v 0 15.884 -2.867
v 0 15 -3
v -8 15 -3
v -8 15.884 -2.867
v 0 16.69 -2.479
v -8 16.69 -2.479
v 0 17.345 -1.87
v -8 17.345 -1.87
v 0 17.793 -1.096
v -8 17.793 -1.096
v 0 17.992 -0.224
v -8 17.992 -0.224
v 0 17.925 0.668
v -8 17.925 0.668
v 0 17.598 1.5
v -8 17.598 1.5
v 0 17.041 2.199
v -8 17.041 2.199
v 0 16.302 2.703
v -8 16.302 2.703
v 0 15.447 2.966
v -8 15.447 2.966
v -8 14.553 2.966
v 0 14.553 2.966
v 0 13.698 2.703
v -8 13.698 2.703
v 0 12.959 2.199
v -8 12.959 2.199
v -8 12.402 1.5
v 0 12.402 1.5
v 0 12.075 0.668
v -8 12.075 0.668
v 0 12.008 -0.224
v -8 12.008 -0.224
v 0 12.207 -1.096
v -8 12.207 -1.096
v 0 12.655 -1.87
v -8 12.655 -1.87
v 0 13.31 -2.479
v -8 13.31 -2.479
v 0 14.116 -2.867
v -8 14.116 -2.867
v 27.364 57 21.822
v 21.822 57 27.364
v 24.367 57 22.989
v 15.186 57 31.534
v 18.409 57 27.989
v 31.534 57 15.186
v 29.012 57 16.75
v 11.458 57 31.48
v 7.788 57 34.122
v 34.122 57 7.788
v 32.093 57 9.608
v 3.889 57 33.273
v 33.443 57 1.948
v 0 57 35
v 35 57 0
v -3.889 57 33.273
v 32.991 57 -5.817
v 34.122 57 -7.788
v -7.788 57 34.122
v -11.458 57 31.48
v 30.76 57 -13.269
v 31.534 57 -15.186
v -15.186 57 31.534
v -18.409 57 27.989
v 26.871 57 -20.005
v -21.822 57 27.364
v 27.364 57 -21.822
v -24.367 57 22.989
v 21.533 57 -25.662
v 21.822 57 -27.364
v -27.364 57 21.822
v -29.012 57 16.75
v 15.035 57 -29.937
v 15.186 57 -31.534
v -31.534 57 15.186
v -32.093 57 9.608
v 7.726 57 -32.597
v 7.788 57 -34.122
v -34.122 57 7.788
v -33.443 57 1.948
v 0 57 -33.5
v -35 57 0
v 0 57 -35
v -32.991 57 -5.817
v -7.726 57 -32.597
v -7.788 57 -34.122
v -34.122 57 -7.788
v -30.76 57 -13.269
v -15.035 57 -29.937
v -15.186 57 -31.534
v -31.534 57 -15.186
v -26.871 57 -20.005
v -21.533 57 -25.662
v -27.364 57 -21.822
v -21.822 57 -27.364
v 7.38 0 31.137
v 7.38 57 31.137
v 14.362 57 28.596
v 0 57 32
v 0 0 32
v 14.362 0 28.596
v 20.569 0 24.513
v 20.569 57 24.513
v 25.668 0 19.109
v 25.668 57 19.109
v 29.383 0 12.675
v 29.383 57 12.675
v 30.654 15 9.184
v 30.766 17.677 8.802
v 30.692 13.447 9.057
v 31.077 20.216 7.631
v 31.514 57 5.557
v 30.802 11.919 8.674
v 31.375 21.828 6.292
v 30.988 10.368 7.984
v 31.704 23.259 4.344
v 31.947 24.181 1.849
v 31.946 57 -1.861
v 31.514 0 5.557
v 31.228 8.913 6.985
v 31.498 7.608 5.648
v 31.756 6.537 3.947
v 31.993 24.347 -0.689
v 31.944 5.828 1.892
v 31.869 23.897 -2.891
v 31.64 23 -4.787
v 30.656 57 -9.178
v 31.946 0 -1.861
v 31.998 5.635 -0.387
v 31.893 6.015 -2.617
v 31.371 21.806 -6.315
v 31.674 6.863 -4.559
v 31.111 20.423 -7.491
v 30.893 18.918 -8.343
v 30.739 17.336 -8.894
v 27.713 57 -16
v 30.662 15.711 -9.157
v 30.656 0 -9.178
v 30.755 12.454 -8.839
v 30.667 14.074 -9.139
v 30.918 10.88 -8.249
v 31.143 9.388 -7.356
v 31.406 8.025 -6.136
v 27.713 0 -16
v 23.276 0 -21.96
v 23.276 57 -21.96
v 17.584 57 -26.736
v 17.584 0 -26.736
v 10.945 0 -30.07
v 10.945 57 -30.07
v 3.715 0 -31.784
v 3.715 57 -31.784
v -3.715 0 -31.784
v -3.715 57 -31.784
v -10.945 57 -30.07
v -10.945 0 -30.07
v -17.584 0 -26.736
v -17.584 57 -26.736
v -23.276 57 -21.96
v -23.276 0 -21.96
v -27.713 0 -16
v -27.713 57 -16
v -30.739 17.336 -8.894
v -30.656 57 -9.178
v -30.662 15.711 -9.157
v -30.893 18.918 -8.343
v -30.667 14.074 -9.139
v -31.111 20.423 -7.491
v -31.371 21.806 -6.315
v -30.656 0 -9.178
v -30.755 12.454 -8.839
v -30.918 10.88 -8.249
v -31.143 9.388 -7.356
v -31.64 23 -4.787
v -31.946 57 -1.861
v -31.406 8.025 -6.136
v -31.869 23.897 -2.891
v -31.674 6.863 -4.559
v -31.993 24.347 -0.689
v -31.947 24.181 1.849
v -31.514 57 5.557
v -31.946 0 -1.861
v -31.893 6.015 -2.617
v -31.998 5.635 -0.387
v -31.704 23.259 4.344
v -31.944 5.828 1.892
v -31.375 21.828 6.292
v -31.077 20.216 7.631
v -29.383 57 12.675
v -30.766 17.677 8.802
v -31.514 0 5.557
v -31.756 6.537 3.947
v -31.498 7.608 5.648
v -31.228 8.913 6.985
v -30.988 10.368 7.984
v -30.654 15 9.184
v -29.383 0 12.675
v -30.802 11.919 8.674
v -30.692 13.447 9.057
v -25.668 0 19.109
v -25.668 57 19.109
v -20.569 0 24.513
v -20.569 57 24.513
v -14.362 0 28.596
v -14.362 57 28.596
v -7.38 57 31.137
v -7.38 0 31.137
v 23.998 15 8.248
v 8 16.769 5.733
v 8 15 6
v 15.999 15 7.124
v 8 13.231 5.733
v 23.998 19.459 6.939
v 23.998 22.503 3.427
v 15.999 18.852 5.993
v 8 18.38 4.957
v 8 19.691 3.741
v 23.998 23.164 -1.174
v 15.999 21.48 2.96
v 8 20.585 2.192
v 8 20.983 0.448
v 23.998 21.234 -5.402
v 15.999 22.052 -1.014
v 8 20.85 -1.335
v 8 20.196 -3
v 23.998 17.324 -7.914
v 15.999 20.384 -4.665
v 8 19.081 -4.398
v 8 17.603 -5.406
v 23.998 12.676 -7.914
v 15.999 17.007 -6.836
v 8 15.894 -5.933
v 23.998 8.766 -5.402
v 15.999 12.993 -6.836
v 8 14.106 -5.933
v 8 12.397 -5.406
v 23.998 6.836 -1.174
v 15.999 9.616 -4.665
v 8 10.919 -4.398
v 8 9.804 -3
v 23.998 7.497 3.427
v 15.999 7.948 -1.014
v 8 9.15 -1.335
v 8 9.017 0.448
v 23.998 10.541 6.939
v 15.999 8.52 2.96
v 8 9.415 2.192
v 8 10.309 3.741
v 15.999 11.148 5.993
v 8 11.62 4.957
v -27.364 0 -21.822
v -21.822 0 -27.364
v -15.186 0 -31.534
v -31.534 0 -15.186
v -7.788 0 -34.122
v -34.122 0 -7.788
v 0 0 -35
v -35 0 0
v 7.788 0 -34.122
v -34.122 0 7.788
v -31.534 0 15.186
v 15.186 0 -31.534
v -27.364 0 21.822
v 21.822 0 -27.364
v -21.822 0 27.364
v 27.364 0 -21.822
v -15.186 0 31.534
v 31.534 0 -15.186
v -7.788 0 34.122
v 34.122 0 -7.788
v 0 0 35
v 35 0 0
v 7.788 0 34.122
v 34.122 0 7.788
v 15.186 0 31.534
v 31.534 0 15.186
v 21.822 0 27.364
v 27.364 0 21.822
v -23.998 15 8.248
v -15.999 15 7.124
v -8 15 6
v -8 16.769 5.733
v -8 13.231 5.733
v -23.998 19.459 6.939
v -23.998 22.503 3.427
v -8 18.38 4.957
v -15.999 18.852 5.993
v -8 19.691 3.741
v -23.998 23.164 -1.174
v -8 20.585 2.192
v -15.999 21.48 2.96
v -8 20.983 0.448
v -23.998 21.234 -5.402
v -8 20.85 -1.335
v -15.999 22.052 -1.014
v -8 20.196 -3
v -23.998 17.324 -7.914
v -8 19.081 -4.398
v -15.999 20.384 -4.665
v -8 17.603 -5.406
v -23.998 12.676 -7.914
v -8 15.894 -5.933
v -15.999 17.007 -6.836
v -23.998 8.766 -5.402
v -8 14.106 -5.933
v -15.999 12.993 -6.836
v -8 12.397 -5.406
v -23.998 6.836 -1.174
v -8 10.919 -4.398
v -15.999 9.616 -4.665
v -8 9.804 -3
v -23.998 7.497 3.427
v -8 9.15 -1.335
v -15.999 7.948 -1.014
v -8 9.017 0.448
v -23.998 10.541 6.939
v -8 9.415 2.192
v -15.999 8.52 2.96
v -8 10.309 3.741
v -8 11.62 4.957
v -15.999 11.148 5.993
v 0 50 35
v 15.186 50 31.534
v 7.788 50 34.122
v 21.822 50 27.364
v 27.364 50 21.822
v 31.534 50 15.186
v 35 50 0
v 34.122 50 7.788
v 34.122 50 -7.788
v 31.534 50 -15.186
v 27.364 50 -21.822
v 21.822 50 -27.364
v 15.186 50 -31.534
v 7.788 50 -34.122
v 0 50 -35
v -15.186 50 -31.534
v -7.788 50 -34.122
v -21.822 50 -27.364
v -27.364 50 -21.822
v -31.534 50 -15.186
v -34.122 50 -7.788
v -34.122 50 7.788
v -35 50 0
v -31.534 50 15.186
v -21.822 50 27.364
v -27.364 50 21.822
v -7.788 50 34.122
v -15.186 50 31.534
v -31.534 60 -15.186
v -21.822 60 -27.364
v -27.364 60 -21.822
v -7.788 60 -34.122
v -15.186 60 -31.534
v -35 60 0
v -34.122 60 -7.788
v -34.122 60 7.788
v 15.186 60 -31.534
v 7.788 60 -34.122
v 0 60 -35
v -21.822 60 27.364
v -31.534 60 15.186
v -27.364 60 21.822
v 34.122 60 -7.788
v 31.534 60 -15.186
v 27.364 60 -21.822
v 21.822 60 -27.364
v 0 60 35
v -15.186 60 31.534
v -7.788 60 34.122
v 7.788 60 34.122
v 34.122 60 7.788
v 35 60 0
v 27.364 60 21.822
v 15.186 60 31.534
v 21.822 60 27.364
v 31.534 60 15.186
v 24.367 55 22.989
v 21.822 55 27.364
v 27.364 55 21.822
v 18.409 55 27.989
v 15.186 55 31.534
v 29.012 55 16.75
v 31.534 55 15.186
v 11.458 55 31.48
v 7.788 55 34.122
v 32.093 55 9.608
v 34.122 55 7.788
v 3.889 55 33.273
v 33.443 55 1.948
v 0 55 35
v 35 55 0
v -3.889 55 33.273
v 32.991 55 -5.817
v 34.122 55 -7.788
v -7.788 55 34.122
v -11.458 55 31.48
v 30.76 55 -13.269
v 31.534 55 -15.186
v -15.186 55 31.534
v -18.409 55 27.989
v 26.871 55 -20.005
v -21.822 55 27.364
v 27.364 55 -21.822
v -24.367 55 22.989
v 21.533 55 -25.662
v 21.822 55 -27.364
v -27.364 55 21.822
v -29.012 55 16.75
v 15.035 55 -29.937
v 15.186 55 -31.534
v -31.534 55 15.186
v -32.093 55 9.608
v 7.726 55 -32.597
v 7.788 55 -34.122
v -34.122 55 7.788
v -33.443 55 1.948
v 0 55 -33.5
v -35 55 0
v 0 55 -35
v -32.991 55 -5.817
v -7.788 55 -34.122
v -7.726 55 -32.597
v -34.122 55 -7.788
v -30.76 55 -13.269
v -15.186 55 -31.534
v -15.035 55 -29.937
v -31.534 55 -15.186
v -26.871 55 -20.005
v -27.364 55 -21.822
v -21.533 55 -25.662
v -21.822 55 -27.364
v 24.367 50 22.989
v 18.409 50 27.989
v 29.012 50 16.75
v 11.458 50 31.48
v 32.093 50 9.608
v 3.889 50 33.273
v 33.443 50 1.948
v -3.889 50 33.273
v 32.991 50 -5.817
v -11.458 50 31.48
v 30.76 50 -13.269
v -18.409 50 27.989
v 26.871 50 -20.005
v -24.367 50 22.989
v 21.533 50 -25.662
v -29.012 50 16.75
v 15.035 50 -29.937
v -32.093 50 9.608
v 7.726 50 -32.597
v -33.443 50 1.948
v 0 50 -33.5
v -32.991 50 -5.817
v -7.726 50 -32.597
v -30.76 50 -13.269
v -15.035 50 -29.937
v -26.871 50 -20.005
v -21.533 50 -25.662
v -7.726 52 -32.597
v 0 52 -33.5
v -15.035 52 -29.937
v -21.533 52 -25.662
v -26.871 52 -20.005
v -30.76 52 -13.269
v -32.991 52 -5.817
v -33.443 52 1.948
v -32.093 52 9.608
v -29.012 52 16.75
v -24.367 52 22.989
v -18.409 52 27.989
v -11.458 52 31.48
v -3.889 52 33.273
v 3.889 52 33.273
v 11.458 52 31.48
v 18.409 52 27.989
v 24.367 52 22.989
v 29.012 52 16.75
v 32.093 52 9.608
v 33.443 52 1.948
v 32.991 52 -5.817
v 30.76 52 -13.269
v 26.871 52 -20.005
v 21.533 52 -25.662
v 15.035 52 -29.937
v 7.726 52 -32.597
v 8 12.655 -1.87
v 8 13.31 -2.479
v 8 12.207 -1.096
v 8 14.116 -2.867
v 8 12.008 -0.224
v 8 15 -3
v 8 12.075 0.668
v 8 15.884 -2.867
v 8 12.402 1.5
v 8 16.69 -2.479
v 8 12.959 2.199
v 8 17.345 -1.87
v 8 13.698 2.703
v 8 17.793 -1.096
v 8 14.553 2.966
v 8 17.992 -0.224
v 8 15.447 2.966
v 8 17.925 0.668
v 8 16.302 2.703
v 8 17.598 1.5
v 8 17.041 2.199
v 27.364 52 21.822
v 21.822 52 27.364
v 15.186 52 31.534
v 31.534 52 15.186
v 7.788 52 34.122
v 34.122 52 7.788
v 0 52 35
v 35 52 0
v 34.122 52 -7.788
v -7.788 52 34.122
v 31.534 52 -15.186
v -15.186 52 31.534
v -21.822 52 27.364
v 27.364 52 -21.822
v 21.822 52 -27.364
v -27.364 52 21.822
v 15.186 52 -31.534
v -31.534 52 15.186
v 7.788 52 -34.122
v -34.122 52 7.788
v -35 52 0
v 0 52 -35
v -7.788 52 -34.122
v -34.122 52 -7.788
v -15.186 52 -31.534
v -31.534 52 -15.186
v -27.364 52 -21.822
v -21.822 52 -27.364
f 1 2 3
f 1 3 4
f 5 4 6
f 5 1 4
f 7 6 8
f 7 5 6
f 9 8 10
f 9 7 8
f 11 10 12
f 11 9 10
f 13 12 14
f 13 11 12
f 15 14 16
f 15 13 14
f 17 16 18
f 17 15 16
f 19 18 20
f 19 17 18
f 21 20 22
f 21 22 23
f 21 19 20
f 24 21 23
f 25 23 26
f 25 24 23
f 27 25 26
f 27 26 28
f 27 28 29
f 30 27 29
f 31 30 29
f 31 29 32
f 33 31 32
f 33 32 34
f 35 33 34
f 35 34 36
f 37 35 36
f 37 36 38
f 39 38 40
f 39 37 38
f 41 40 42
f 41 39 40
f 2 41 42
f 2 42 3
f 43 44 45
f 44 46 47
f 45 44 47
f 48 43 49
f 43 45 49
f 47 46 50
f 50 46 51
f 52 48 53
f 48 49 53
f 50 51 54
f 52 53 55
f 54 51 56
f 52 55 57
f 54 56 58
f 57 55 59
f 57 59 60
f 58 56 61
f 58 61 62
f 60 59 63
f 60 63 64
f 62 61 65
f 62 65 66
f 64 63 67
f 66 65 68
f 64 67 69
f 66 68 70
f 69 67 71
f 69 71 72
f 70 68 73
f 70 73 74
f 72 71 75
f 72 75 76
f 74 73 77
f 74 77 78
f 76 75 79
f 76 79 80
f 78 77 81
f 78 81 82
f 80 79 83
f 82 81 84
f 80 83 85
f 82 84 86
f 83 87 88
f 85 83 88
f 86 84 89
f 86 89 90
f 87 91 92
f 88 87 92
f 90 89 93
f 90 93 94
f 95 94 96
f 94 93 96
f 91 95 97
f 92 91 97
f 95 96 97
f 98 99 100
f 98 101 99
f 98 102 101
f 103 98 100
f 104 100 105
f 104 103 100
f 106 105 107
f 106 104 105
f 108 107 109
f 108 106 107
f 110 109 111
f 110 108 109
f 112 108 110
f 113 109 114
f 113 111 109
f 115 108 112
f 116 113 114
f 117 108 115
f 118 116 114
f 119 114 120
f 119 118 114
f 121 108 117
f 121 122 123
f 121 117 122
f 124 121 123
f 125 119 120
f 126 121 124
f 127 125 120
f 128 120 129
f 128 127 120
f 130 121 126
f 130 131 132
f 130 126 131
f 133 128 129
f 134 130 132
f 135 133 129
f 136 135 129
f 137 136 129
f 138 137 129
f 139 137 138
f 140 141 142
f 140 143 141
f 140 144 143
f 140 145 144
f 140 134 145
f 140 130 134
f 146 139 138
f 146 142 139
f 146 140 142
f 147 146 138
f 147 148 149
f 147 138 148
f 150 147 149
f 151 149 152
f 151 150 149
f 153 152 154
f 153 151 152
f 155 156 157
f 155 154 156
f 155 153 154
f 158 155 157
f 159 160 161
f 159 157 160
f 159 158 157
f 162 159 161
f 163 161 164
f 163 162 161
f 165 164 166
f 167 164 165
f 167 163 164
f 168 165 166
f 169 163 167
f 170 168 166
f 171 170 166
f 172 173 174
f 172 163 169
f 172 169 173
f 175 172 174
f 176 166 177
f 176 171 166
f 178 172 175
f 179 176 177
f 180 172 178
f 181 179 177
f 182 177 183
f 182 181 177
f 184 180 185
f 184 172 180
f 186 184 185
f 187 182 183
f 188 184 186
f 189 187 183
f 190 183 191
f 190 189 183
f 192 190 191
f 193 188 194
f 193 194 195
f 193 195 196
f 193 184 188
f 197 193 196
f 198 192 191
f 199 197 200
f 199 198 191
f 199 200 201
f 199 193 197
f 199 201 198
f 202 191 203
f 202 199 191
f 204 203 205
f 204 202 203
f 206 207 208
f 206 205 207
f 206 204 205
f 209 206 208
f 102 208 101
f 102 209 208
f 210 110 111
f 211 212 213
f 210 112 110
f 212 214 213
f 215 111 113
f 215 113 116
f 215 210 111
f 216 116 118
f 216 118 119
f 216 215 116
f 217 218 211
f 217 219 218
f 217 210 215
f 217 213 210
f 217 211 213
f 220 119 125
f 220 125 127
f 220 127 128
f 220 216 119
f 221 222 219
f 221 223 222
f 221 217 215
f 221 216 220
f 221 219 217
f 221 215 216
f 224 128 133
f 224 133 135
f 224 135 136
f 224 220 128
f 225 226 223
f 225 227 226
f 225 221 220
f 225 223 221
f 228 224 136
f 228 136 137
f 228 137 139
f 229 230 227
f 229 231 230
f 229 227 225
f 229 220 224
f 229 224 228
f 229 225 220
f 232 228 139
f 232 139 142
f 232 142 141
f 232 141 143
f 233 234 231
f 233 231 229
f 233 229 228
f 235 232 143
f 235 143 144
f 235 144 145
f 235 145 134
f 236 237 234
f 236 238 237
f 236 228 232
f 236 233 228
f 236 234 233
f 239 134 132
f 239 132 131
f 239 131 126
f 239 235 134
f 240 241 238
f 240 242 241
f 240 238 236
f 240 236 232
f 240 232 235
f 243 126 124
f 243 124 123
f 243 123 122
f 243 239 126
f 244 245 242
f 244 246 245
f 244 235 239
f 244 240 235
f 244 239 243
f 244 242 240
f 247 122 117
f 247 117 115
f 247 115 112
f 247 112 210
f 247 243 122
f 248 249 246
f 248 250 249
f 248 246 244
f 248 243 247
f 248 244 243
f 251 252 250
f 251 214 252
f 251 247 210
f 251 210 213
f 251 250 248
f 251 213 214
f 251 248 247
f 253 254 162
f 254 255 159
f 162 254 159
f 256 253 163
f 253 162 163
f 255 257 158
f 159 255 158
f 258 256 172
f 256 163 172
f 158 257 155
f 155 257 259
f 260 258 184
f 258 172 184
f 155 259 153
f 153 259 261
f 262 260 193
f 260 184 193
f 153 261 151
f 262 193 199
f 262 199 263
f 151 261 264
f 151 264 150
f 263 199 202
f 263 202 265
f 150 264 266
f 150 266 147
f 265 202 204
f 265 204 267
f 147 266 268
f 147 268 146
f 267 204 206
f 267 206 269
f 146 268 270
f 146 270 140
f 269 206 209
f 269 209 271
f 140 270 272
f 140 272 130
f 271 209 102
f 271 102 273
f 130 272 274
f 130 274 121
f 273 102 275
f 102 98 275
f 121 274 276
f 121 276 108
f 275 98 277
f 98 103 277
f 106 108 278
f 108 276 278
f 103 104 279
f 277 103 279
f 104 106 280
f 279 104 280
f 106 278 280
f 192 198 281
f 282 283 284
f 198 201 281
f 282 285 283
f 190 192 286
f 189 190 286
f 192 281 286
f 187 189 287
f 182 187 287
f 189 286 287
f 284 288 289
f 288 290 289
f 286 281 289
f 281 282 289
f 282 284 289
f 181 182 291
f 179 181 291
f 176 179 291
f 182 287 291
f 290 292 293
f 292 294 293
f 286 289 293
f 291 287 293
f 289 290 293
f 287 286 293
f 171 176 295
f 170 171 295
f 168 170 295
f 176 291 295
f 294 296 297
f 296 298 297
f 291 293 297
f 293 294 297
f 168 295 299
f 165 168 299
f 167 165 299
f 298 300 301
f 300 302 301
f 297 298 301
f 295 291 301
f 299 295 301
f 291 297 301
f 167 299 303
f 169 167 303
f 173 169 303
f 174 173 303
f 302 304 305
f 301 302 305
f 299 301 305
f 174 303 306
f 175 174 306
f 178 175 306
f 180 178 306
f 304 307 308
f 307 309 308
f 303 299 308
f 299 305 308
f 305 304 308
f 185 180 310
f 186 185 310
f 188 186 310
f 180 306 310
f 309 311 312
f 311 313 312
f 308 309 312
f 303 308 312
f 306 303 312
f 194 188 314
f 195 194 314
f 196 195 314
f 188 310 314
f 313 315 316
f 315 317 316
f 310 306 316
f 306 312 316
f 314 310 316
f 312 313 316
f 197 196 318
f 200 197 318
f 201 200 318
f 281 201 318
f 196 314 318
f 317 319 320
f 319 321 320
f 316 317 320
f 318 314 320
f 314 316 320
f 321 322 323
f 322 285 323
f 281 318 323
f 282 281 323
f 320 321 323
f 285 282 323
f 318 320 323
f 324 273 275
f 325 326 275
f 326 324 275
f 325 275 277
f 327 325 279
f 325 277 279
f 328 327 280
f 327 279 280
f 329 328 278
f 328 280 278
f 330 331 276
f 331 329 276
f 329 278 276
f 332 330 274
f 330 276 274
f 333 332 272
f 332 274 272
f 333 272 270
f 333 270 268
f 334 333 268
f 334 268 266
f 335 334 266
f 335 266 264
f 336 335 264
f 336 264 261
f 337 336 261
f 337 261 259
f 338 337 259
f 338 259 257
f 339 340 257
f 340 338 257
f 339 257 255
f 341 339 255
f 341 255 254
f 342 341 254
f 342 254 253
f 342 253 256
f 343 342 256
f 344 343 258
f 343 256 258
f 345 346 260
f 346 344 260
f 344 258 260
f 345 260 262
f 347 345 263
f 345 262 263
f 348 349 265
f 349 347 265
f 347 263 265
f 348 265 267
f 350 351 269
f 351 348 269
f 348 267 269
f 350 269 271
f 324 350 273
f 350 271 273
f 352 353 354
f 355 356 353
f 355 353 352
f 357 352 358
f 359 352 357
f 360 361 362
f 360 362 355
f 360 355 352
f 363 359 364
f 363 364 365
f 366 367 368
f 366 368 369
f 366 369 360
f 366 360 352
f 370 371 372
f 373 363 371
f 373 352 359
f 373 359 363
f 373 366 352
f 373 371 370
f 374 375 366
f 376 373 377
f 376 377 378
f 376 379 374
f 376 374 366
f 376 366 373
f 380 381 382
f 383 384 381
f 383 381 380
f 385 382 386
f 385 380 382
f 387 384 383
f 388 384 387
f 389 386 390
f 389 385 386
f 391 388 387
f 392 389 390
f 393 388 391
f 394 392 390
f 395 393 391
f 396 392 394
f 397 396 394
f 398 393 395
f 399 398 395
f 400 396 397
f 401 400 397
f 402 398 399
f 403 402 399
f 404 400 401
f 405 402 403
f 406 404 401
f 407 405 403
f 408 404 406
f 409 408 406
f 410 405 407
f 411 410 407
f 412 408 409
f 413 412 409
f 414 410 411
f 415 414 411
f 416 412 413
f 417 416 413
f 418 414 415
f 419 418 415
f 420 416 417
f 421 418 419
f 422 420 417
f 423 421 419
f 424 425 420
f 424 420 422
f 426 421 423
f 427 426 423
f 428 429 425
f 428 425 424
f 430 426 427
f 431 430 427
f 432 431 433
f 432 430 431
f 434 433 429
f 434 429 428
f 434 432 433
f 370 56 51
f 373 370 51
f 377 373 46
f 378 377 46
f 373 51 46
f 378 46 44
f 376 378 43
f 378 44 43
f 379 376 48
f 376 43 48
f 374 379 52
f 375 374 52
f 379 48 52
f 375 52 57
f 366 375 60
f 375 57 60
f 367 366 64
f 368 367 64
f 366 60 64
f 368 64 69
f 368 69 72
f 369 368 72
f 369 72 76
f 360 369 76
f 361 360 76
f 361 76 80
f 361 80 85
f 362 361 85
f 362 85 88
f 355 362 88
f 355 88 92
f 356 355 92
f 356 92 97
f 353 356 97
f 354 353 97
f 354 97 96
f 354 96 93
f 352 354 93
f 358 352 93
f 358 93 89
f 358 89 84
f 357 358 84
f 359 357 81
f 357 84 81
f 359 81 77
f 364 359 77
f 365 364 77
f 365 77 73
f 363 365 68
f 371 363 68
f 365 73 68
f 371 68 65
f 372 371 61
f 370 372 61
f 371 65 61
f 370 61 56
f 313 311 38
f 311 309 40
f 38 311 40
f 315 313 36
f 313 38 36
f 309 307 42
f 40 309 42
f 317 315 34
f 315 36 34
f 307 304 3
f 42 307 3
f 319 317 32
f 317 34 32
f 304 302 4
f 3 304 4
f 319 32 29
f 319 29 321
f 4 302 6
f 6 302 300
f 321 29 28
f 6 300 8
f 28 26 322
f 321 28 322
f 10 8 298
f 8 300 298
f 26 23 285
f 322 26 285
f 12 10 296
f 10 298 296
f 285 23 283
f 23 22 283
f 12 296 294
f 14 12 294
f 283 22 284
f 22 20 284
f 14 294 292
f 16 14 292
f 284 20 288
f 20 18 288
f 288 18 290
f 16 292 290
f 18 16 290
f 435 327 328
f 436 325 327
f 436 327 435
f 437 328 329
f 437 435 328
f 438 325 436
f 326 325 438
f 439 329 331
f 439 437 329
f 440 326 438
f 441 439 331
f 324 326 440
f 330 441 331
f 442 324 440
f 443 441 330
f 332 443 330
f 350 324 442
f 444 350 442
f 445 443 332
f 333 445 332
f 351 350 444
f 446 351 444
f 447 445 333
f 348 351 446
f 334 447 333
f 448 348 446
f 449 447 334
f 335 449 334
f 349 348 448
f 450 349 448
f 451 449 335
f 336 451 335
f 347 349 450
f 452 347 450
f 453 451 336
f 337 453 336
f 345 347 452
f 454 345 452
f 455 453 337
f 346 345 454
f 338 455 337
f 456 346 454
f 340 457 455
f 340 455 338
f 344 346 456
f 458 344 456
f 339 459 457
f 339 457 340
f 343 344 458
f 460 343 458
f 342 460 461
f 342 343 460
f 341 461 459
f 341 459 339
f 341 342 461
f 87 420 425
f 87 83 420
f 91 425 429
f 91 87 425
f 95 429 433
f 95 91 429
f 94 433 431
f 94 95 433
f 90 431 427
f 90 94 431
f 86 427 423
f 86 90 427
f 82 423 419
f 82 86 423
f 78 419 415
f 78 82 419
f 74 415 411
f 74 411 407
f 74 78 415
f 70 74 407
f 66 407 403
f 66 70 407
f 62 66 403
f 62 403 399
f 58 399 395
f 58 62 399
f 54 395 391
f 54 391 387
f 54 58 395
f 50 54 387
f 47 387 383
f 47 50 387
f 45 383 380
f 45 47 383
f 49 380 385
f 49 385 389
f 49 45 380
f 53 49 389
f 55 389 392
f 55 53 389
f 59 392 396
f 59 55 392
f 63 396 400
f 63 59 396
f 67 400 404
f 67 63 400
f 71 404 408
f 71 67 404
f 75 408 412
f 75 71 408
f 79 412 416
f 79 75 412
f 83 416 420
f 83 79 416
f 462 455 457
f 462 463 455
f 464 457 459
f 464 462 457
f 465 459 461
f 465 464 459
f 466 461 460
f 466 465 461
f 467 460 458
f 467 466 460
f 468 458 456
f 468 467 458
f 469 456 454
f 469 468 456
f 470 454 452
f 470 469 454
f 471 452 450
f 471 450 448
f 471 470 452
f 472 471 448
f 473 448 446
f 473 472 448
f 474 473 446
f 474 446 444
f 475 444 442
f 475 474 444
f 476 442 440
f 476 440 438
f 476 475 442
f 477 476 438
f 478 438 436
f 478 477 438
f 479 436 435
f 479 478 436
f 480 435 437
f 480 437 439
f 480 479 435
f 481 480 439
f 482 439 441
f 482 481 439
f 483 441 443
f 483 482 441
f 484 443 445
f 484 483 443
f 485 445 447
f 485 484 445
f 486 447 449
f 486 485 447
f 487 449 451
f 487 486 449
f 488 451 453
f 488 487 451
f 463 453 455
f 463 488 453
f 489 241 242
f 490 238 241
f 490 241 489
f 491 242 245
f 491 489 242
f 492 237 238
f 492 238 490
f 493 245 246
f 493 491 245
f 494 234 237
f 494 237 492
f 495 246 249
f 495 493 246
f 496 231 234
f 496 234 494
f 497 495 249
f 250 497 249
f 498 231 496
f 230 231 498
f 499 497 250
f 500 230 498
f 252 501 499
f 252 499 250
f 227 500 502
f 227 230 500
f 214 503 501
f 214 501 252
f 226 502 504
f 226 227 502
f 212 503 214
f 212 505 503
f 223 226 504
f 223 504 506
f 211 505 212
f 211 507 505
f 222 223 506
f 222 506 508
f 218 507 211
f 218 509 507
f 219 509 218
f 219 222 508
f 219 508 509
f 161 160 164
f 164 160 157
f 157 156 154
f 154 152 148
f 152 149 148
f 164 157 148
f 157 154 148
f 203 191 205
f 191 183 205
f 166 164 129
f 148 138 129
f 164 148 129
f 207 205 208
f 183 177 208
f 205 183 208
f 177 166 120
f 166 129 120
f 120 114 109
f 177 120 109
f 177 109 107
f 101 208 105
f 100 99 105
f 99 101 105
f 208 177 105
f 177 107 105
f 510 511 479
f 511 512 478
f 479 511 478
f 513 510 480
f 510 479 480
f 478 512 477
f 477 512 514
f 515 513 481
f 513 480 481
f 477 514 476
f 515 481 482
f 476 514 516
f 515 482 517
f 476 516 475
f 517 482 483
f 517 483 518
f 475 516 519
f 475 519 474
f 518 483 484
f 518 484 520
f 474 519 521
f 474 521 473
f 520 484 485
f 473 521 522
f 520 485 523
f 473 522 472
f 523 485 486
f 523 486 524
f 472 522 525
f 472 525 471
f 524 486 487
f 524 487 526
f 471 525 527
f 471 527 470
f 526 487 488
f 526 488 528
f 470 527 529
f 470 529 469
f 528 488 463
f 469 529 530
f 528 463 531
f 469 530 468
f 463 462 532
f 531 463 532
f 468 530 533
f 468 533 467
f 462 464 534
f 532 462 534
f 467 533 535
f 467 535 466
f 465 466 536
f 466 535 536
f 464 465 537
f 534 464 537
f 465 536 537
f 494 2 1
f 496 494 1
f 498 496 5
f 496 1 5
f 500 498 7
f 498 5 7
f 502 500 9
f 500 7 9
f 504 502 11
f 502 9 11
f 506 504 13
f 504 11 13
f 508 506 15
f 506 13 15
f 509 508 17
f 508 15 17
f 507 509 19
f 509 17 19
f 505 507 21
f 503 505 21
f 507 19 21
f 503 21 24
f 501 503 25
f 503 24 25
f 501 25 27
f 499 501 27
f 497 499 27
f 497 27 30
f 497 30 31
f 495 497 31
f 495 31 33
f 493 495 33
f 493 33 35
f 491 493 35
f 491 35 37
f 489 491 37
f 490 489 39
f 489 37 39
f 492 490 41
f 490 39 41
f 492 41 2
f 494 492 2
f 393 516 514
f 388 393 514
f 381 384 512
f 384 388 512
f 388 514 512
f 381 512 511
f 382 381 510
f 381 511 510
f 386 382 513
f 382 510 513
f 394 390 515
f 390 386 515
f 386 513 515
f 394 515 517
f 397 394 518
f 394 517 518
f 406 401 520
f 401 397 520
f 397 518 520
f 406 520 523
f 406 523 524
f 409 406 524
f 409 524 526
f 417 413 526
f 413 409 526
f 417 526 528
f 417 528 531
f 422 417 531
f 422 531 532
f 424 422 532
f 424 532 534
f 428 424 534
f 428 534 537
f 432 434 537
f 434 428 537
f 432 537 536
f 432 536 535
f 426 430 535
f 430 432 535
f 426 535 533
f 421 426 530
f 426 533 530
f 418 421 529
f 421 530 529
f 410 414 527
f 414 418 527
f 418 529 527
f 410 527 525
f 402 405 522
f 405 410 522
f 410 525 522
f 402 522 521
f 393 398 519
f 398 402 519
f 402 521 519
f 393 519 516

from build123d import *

# Parameters (mm, degrees)
SKETCH_1_R           = 35
EXTRUDE_1_DEPTH      = 60
SHELL_1_T            = -3
SKETCH_2_R           = 3
EXTRUDE_2_DEPTH      = 8
EXTRUDE_3_REACH      = 83.695
EXTRUDE_3_END_RADIUS = 32
SKETCH_3_R           = 6
EXTRUDE_3_DRAFT      = -8
SKETCH_4_W           = 1.5
SKETCH_4_H           = 2


with BuildPart() as part:
    # 草图1 → 拉伸1 (new body)
    with BuildSketch(Plane(origin=(0, 0, 0), x_dir=(1, 0, 0), z_dir=(0, 1, 0))):
        with Locations(Location((0, 0, 0), (0, 0, 270))):
            Circle(SKETCH_1_R)
    extrude(amount=EXTRUDE_1_DEPTH)

    # 抽壳1
    shell_1_openings = [part.faces().sort_by_distance(p)[0] for p in [
        (0, 0, 0),
    ]]
    offset(amount=SHELL_1_T, openings=shell_1_openings, kind=Kind.INTERSECTION)



with BuildPart() as body_2:
    # 草图2 → 拉伸2 (new body)
    with BuildSketch(Plane(origin=(0, 0, 0), x_dir=(0, 0, -1), z_dir=(1, 0, 0))):
        with Locations((0, 15)):
            Circle(SKETCH_2_R)
    extrude_2 = extrude(amount=-EXTRUDE_2_DEPTH)


with BuildPart() as part_1:
    add(part.part)

    add(body_2.part)  # 拉伸3 merges body 2
    # 拉伸3: up to this cylinder (the profile starts inside it)
    extrude_3_end = Plane(origin=(0, 15, 0), z_dir=(0, -1, 0)) * Cylinder(EXTRUDE_3_END_RADIUS, 232.39, mode=Mode.PRIVATE)



with BuildPart() as extrude_3_long_prism_1:
    # 草图3 → 拉伸3 (the long prism of profile 1, to be tilted and cut off)
    with BuildSketch(Plane.ZY.offset(8)):
        with Locations((0, 15)):
            Circle(SKETCH_3_R)
    extrude(amount=EXTRUDE_3_REACH)
    extrude_3_tool1_sides = [extrude_3_long_prism_1.faces().sort_by_distance(p)[0] for p in [
        (-49.8475, 15, -6),
    ]]
    draft(extrude_3_tool1_sides, Plane.ZY.offset(8), EXTRUDE_3_DRAFT)  # the draft: side faces tilted about the start plane


with BuildPart() as part_2:
    add(part_1.part)
    extrude_3_tool1 = extrude_3_long_prism_1.part & extrude_3_end
    extrude_3 = extrude_3_tool1.solids().sort_by_distance((-8, 15, 0))[0]
    add(extrude_3)

    # 镜向1: 拉伸2, 拉伸3 across plane
    add(extrude_2.mirror(Plane(origin=(0, 15, 0), x_dir=(0, 0, 1), z_dir=(1, 0, 0))))
    add(extrude_3.mirror(Plane(origin=(0, 15, 0), x_dir=(0, 0, 1), z_dir=(1, 0, 0))))

    # 草图4 → 切除-旋转1 (revolve, cut)
    with BuildSketch(Plane.XY, mode=Mode.PRIVATE) as cut_revolve_1_sk:
        with Locations((-34.25, 56)):
            Rectangle(SKETCH_4_W, SKETCH_4_H)
        with Locations((-34.25, 51)):
            Rectangle(SKETCH_4_W, SKETCH_4_H)
    revolve(cut_revolve_1_sk.sketch.rotate(Axis((0, 47.542228421, 0), (0, 1, 0)), 270), axis=Axis((0, 47.542228421, 0), (0, 1, 0)), mode=Mode.SUBTRACT)


solid = part_2.part
